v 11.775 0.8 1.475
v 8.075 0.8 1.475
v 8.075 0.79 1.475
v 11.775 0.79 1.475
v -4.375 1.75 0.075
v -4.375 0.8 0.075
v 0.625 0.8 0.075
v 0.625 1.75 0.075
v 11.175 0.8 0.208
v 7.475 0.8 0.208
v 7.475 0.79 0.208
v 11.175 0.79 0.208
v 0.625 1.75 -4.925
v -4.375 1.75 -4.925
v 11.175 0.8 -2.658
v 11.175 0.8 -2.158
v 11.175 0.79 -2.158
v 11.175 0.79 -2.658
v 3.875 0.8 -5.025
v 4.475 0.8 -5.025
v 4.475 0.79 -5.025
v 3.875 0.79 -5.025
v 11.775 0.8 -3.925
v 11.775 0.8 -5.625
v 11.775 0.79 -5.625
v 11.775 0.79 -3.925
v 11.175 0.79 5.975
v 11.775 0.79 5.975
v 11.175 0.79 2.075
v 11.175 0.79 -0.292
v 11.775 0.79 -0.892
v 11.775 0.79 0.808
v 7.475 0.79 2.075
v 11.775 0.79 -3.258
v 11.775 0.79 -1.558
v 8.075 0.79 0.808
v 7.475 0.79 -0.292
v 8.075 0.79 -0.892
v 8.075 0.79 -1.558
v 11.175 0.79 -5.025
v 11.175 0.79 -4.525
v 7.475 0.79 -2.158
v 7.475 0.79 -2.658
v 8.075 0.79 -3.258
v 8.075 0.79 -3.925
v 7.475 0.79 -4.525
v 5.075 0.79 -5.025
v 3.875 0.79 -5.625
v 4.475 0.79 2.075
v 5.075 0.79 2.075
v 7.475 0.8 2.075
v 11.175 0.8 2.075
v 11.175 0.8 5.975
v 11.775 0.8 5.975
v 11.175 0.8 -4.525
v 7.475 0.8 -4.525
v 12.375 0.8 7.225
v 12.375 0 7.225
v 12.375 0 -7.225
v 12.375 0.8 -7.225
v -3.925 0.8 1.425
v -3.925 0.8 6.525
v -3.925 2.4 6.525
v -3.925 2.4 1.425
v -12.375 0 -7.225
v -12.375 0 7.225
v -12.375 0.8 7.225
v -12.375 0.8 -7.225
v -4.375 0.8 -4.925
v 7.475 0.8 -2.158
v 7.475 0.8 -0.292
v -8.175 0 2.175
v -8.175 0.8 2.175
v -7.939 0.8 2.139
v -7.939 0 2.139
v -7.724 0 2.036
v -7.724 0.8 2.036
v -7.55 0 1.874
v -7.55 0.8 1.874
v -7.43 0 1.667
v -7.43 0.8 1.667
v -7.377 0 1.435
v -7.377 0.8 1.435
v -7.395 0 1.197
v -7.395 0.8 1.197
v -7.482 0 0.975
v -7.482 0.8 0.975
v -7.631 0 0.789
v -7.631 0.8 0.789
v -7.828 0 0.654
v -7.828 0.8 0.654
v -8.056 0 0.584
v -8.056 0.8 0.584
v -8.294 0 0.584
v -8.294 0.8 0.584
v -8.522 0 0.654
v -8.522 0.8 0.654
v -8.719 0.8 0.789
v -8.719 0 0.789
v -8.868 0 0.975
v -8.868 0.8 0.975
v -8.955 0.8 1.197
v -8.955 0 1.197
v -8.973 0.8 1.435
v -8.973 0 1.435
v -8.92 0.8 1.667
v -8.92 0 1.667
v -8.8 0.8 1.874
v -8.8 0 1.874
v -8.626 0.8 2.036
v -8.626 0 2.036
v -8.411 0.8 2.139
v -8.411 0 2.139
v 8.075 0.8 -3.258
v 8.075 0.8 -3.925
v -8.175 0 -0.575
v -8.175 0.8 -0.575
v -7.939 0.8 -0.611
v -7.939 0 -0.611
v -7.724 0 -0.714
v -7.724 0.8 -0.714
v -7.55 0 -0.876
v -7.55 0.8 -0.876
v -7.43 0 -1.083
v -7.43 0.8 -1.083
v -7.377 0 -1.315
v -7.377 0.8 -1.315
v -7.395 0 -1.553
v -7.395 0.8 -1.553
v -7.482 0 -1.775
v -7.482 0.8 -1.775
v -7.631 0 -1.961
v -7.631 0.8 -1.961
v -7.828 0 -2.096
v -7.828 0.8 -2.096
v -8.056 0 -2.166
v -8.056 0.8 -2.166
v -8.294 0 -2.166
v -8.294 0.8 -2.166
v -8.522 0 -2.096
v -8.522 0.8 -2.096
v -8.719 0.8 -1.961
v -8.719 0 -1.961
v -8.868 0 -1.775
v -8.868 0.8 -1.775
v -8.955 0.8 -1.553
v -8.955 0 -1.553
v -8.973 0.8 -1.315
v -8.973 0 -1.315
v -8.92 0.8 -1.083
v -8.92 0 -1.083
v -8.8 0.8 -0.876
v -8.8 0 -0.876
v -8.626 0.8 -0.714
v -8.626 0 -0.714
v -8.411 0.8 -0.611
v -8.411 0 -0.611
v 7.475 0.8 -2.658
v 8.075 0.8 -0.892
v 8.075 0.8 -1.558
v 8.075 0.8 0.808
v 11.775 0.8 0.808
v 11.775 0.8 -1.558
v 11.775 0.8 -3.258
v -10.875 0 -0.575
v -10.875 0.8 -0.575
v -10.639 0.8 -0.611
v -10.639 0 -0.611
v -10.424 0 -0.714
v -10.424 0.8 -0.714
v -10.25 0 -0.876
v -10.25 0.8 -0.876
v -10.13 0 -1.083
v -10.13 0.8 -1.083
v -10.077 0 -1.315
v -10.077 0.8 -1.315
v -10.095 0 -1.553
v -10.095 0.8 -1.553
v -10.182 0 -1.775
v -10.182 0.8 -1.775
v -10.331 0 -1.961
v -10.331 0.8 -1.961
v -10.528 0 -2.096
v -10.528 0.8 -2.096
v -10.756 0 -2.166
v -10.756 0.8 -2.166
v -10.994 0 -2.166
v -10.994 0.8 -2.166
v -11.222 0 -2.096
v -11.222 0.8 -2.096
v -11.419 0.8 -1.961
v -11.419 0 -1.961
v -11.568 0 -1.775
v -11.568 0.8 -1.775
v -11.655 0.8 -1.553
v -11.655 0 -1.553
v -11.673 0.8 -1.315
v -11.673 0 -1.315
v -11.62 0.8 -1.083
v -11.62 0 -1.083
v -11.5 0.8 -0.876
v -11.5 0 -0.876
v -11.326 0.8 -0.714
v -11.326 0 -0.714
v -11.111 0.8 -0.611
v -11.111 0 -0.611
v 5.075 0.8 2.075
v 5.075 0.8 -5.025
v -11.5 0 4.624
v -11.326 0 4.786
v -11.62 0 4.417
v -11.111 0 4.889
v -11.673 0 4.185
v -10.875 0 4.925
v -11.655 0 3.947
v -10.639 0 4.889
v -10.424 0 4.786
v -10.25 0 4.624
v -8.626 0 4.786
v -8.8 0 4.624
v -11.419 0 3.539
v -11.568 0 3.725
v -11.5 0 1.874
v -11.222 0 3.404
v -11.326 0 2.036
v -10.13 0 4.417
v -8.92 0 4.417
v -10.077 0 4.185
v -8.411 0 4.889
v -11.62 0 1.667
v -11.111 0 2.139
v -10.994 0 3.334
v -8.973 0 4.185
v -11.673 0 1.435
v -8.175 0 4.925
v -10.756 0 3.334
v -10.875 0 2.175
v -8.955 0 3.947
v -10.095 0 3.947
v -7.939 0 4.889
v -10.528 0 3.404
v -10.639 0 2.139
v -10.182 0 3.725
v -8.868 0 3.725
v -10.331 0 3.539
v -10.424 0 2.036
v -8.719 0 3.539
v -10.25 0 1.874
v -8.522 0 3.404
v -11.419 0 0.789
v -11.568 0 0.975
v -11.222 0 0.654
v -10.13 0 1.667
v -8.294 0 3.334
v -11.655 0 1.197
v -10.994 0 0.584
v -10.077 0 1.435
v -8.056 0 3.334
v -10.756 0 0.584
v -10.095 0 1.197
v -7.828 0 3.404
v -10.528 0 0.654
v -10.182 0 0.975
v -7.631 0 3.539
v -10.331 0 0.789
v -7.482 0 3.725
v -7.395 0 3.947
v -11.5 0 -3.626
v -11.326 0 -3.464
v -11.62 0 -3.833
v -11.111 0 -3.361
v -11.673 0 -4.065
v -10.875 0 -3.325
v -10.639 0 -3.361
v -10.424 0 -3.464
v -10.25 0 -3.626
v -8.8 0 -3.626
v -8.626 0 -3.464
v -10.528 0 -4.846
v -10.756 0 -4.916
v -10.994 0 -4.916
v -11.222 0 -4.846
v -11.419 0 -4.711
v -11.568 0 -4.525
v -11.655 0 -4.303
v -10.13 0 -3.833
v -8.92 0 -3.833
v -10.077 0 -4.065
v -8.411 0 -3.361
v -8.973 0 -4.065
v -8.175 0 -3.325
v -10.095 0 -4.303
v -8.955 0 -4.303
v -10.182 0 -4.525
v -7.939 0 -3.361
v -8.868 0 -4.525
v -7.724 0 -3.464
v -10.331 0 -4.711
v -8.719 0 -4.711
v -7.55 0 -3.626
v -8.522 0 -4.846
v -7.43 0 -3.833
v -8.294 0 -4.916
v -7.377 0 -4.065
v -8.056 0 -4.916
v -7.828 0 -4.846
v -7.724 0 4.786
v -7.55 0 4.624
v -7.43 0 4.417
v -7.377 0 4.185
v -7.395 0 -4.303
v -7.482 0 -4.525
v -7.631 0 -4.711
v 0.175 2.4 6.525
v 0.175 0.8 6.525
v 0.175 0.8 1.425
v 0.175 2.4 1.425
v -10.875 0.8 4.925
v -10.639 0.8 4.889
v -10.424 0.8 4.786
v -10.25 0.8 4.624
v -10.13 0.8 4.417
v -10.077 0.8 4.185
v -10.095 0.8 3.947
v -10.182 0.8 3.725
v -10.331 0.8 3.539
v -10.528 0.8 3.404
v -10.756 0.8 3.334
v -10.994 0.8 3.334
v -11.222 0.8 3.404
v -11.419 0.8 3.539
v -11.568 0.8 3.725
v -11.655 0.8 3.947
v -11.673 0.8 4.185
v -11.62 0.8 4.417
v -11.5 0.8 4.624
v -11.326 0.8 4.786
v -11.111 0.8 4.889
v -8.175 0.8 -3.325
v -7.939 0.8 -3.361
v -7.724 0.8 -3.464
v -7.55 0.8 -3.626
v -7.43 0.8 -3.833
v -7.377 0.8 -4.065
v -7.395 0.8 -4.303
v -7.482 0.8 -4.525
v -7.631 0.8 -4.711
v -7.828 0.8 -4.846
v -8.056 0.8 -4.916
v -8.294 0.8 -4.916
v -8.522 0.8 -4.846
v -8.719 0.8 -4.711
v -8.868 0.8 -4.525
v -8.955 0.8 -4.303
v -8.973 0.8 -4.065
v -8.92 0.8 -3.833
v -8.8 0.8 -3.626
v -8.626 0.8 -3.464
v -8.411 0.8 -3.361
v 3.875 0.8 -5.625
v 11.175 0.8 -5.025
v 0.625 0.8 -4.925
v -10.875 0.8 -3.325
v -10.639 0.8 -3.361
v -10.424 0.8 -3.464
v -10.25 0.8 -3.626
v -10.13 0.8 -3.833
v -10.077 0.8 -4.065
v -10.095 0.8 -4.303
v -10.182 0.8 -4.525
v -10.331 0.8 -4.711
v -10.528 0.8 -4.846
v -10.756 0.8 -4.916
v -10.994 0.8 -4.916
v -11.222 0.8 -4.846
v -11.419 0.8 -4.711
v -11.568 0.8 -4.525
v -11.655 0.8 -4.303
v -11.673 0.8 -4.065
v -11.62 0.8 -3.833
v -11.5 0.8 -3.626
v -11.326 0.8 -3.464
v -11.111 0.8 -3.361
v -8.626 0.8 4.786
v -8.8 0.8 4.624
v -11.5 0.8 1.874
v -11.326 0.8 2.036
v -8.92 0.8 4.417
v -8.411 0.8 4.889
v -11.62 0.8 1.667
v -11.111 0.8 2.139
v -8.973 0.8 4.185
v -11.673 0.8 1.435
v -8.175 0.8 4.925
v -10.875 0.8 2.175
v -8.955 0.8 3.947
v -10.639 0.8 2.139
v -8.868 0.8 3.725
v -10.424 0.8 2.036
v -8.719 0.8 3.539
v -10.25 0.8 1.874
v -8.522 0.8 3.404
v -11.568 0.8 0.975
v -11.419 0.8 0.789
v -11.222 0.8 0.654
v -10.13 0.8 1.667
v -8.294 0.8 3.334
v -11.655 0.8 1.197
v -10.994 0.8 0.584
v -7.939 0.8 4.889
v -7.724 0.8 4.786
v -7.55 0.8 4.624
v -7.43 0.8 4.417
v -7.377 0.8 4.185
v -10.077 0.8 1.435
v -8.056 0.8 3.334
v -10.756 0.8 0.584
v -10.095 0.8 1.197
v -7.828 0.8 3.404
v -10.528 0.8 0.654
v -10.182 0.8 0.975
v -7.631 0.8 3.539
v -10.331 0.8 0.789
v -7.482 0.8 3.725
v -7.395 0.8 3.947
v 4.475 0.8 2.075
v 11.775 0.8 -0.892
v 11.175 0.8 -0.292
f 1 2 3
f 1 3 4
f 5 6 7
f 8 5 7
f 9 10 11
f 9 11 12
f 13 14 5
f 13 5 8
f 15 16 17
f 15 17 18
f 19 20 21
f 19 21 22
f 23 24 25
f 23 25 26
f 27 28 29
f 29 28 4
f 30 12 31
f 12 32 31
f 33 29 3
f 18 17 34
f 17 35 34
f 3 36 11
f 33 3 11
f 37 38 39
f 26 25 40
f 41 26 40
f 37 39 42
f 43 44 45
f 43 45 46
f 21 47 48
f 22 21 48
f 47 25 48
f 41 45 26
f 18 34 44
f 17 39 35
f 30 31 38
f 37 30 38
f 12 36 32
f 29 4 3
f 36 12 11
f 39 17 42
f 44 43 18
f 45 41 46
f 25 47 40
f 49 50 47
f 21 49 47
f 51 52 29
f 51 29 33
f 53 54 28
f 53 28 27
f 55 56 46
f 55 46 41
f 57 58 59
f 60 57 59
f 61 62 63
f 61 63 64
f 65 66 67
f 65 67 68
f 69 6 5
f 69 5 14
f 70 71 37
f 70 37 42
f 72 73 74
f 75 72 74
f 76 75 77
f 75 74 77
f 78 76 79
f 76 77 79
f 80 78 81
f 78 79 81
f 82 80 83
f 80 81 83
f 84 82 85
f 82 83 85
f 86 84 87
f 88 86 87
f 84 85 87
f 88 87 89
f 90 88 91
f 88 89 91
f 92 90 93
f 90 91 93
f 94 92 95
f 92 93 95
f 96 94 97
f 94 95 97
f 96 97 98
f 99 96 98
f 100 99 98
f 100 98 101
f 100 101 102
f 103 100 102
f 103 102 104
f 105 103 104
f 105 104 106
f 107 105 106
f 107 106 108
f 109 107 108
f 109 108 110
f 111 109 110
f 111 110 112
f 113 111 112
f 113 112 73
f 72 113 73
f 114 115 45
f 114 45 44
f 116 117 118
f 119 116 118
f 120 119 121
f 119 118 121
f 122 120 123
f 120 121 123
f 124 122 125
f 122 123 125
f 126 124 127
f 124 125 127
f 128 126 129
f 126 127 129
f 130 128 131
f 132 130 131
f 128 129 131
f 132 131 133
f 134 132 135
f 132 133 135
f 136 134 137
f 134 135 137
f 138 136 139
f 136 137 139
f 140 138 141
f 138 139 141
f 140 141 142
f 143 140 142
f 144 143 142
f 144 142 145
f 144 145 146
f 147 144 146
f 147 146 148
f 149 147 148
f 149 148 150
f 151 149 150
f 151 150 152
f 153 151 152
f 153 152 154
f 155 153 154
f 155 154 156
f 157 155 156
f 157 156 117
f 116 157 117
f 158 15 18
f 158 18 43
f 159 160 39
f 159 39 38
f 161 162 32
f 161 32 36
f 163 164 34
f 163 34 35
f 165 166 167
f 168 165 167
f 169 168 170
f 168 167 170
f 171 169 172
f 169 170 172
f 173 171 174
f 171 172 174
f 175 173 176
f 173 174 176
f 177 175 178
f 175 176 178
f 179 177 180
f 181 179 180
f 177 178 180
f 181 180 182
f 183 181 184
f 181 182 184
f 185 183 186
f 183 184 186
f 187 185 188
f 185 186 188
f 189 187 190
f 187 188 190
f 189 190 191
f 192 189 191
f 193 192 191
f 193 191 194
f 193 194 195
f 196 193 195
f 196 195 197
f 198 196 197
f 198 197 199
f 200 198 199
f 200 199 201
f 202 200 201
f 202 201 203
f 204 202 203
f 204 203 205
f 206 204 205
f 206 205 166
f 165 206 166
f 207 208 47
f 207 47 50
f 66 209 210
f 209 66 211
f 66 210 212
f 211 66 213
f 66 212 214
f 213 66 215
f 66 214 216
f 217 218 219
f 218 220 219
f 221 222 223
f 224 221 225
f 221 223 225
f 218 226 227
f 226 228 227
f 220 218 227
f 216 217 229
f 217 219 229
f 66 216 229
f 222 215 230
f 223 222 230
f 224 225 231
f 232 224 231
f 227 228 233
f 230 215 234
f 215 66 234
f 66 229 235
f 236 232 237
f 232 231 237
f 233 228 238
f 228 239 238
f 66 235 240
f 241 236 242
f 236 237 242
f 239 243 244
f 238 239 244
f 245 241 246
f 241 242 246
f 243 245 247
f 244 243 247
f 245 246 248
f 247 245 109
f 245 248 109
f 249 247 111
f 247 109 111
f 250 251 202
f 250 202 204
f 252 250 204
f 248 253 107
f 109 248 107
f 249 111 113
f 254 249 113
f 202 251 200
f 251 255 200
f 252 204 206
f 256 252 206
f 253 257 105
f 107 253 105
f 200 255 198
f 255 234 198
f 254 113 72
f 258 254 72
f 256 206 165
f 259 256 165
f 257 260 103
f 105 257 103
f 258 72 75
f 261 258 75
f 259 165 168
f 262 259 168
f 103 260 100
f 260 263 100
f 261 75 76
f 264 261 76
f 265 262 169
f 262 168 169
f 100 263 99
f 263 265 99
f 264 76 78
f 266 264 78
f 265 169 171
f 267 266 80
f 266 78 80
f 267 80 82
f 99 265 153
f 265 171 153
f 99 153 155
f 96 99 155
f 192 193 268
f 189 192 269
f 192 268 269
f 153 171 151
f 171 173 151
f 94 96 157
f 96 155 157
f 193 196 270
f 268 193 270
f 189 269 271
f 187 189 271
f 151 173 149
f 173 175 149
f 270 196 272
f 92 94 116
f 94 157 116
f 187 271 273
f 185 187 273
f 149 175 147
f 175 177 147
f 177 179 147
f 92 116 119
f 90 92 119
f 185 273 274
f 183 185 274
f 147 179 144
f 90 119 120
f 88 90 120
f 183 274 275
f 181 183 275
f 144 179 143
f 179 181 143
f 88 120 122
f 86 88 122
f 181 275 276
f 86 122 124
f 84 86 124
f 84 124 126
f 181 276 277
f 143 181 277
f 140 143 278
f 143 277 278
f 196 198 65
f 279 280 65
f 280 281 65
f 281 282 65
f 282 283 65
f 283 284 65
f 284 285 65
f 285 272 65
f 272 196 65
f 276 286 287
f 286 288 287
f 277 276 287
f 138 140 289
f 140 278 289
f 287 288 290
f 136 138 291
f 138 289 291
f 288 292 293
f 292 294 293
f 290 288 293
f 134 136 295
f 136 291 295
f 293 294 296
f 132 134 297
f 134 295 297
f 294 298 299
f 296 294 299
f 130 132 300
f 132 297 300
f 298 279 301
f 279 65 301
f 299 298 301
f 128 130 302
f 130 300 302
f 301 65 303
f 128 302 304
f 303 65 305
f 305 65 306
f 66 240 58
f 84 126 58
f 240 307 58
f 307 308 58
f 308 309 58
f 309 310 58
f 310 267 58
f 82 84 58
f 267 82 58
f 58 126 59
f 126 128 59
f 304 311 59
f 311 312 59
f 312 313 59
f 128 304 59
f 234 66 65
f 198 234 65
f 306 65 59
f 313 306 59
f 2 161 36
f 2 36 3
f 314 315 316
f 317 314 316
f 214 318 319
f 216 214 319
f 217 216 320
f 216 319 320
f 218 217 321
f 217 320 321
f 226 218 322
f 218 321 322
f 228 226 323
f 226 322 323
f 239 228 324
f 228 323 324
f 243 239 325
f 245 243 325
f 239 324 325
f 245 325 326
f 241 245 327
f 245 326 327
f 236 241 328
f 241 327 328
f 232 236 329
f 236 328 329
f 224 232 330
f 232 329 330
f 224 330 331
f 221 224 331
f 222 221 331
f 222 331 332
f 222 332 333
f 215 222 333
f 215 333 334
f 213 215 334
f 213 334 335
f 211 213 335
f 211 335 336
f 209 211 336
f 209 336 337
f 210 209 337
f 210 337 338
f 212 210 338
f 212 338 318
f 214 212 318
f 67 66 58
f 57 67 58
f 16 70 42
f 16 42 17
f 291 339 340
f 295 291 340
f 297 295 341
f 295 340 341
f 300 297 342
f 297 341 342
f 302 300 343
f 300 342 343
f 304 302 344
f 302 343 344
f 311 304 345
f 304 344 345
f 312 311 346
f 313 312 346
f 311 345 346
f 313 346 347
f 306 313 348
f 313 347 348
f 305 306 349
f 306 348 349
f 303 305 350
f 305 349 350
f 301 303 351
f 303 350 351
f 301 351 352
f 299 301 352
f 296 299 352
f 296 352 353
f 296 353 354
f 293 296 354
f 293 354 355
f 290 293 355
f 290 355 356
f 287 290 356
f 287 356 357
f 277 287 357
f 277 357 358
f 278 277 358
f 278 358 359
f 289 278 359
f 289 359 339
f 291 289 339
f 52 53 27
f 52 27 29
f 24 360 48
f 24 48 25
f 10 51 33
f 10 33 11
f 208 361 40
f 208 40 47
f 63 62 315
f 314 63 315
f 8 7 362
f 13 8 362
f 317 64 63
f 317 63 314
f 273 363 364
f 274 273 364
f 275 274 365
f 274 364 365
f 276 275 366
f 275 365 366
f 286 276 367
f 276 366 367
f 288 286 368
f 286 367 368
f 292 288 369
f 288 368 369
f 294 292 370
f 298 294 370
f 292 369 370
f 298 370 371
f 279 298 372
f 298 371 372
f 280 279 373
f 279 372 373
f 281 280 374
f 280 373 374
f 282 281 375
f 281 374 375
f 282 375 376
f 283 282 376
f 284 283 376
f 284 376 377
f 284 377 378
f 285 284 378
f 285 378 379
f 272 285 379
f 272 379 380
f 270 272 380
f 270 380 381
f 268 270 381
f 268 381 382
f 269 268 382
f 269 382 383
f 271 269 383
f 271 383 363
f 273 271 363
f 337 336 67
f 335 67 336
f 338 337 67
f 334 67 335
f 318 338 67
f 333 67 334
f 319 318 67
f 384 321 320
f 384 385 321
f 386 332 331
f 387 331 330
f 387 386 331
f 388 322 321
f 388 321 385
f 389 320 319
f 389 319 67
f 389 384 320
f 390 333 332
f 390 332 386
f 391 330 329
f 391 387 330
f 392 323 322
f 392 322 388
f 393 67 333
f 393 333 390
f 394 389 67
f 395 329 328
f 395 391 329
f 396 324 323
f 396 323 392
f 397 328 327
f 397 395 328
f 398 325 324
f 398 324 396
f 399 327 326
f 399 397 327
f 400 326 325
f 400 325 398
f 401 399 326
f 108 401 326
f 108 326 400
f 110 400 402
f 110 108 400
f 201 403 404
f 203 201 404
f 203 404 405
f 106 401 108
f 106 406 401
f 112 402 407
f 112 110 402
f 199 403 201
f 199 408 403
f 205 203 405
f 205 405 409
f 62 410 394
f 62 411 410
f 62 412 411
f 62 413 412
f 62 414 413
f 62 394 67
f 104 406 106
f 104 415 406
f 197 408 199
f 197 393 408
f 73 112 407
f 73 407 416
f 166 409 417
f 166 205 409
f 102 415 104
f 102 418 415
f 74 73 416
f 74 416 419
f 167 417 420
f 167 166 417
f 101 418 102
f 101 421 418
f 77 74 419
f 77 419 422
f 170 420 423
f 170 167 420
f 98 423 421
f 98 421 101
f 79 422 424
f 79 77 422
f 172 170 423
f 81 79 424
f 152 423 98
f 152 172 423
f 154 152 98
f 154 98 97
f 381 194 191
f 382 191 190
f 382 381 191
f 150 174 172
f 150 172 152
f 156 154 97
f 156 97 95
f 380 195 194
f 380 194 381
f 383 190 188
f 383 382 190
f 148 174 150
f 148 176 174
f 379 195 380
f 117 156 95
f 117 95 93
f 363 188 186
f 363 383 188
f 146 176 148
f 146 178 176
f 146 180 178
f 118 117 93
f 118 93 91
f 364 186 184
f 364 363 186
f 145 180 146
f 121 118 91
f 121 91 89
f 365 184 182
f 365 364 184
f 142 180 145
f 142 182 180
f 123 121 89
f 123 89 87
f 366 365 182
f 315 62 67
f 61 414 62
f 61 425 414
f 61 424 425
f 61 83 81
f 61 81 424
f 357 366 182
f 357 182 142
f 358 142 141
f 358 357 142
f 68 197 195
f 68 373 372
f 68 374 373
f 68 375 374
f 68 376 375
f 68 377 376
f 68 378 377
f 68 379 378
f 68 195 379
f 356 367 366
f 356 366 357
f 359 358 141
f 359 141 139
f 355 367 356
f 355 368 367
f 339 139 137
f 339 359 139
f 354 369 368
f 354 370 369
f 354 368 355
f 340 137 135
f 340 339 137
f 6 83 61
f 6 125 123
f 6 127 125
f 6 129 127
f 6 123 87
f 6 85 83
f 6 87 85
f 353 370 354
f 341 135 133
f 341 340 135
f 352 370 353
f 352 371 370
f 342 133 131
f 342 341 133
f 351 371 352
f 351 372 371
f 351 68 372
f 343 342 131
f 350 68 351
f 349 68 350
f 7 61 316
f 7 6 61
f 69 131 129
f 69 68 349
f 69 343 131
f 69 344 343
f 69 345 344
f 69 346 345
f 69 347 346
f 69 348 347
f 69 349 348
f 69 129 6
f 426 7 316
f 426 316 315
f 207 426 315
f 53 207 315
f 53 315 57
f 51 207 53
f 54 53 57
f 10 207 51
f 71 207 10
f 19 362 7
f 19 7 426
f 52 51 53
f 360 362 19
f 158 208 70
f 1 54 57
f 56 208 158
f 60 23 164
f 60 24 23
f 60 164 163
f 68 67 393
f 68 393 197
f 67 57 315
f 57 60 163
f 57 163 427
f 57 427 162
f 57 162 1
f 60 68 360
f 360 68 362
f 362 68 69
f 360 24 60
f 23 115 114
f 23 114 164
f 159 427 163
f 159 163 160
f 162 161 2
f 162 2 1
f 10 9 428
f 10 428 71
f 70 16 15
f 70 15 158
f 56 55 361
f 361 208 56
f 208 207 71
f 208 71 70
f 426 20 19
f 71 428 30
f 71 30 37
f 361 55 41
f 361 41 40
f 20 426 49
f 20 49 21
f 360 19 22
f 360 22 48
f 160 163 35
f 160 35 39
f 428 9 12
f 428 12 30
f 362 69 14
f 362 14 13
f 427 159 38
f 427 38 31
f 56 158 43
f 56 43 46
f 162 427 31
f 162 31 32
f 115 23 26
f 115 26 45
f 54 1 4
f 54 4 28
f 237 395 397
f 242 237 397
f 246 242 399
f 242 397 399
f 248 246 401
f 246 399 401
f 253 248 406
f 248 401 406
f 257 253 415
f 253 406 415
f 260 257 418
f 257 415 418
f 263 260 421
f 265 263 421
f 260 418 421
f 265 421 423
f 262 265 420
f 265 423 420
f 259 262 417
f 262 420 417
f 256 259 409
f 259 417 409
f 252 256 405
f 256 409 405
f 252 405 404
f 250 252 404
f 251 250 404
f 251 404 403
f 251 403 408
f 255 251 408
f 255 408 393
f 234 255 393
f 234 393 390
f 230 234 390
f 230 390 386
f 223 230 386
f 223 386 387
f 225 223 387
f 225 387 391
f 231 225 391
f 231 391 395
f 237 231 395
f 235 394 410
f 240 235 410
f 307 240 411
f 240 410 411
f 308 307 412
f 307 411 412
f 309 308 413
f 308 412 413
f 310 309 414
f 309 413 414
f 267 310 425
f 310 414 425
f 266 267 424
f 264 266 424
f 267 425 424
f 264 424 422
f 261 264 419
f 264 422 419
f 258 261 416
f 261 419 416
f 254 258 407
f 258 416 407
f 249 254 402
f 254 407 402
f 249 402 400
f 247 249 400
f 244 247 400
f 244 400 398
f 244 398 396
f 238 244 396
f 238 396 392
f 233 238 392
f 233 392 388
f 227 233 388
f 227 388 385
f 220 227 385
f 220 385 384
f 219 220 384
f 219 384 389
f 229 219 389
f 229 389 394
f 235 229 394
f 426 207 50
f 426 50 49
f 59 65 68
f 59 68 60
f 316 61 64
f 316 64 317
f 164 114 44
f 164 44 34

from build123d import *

# Parameters (mm, degrees)
ESQUISSE1_W             = 24.75
ESQUISSE1_H             = 14.45
BOSS_EXTRU_1_DEPTH      = 0.8
ESQUISSE2_W             = 5
ESQUISSE2_H             = 5
BOSS_EXTRU_2_DEPTH      = 0.95
ESQUISSE4_W             = 4.1
ESQUISSE4_H             = 5.1
BOSS_EXTRU_3_DEPTH      = 1.6
ESQUISSE5_R             = 0.8
ENL_V_MAT_EXTRU_1_DEPTH = 1.6
ENL_V_MAT_EXTRU_2_DEPTH = 0.01


with BuildPart() as part:
    # Esquisse1 → Boss.-Extru.1 (new body)
    with BuildSketch(Plane(origin=(0, 0, 0), x_dir=(1, 0, 0), z_dir=(0, 1, 0))):
        Rectangle(ESQUISSE1_W, ESQUISSE1_H)
    extrude(amount=BOSS_EXTRU_1_DEPTH)

    # Esquisse2 → Boss.-Extru.2 (add)
    with BuildSketch(Plane(origin=(0, 0.8, 0), x_dir=(1, 0, 0), z_dir=(0, 1, 0))):
        with Locations((-1.875, 2.425)):
            Rectangle(ESQUISSE2_W, ESQUISSE2_H)
    extrude(amount=BOSS_EXTRU_2_DEPTH)

    # Esquisse4 → Boss.-Extru.3 (add)
    with BuildSketch(Plane(origin=(0, 0.8, 0), x_dir=(1, 0, 0), z_dir=(0, 1, 0))):
        with Locations((-1.875, -3.975)):
            Rectangle(ESQUISSE4_W, ESQUISSE4_H)
    extrude(amount=BOSS_EXTRU_3_DEPTH)

    # Esquisse5 → Enlèv. mat.-Extru.1 (cut)
    with BuildSketch(Plane(origin=(0, 0.8, 0), x_dir=(1, 0, 0), z_dir=(0, 1, 0))):
        with Locations(Location((-10.875, -4.125, 0), (0, 0, 270))):
            Circle(ESQUISSE5_R)
        with Locations(Location((-10.875, -1.375, 0), (0, 0, 270))):
            Circle(ESQUISSE5_R)
        with Locations(Location((-10.875, 1.375, 0), (0, 0, 270))):
            Circle(ESQUISSE5_R)
        with Locations(Location((-10.875, 4.125, 0), (0, 0, 270))):
            Circle(ESQUISSE5_R)
        with Locations(Location((-8.175, 4.125, 0), (0, 0, 270))):
            Circle(ESQUISSE5_R)
        with Locations(Location((-8.175, 1.375, 0), (0, 0, 270))):
            Circle(ESQUISSE5_R)
        with Locations(Location((-8.175, -1.375, 0), (0, 0, 270))):
            Circle(ESQUISSE5_R)
        with Locations(Location((-8.175, -4.125, 0), (0, 0, 270))):
            Circle(ESQUISSE5_R)
    extrude(amount=-ENL_V_MAT_EXTRU_1_DEPTH, mode=Mode.SUBTRACT)

    # Esquisse6 → Enlèv. mat.-Extru.2 (cut)
    with BuildSketch(Plane(origin=(0, 0.8, 0), x_dir=(1, 0, 0), z_dir=(0, 1, 0))):
        Polygon((3.875, 5.625), (11.775, 5.625), (11.775, 3.925), (8.075, 3.925), (8.075, 3.258333333), (11.775, 3.258333333), (11.775, 1.558333333), (8.075, 1.558333333), (8.075, 0.891666667), (11.775, 0.891666667), (11.775, -0.808333333), (8.075, -0.808333333), (8.075, -1.475), (11.775, -1.475), (11.775, -5.975), (11.175, -5.975), (11.175, -2.075), (7.475, -2.075), (7.475, -0.208333333), (11.175, -0.208333333), (11.175, 0.291666667), (7.475, 0.291666667), (7.475, 2.158333333), (11.175, 2.158333333), (11.175, 2.658333333), (7.475, 2.658333333), (7.475, 4.525), (11.175, 4.525), (11.175, 5.025), (5.075, 5.025), (5.075, -2.075), (4.475, -2.075), (4.475, 5.025), (3.875, 5.025), align=None)
    extrude(amount=-ENL_V_MAT_EXTRU_2_DEPTH, mode=Mode.SUBTRACT)


solid = part.part
